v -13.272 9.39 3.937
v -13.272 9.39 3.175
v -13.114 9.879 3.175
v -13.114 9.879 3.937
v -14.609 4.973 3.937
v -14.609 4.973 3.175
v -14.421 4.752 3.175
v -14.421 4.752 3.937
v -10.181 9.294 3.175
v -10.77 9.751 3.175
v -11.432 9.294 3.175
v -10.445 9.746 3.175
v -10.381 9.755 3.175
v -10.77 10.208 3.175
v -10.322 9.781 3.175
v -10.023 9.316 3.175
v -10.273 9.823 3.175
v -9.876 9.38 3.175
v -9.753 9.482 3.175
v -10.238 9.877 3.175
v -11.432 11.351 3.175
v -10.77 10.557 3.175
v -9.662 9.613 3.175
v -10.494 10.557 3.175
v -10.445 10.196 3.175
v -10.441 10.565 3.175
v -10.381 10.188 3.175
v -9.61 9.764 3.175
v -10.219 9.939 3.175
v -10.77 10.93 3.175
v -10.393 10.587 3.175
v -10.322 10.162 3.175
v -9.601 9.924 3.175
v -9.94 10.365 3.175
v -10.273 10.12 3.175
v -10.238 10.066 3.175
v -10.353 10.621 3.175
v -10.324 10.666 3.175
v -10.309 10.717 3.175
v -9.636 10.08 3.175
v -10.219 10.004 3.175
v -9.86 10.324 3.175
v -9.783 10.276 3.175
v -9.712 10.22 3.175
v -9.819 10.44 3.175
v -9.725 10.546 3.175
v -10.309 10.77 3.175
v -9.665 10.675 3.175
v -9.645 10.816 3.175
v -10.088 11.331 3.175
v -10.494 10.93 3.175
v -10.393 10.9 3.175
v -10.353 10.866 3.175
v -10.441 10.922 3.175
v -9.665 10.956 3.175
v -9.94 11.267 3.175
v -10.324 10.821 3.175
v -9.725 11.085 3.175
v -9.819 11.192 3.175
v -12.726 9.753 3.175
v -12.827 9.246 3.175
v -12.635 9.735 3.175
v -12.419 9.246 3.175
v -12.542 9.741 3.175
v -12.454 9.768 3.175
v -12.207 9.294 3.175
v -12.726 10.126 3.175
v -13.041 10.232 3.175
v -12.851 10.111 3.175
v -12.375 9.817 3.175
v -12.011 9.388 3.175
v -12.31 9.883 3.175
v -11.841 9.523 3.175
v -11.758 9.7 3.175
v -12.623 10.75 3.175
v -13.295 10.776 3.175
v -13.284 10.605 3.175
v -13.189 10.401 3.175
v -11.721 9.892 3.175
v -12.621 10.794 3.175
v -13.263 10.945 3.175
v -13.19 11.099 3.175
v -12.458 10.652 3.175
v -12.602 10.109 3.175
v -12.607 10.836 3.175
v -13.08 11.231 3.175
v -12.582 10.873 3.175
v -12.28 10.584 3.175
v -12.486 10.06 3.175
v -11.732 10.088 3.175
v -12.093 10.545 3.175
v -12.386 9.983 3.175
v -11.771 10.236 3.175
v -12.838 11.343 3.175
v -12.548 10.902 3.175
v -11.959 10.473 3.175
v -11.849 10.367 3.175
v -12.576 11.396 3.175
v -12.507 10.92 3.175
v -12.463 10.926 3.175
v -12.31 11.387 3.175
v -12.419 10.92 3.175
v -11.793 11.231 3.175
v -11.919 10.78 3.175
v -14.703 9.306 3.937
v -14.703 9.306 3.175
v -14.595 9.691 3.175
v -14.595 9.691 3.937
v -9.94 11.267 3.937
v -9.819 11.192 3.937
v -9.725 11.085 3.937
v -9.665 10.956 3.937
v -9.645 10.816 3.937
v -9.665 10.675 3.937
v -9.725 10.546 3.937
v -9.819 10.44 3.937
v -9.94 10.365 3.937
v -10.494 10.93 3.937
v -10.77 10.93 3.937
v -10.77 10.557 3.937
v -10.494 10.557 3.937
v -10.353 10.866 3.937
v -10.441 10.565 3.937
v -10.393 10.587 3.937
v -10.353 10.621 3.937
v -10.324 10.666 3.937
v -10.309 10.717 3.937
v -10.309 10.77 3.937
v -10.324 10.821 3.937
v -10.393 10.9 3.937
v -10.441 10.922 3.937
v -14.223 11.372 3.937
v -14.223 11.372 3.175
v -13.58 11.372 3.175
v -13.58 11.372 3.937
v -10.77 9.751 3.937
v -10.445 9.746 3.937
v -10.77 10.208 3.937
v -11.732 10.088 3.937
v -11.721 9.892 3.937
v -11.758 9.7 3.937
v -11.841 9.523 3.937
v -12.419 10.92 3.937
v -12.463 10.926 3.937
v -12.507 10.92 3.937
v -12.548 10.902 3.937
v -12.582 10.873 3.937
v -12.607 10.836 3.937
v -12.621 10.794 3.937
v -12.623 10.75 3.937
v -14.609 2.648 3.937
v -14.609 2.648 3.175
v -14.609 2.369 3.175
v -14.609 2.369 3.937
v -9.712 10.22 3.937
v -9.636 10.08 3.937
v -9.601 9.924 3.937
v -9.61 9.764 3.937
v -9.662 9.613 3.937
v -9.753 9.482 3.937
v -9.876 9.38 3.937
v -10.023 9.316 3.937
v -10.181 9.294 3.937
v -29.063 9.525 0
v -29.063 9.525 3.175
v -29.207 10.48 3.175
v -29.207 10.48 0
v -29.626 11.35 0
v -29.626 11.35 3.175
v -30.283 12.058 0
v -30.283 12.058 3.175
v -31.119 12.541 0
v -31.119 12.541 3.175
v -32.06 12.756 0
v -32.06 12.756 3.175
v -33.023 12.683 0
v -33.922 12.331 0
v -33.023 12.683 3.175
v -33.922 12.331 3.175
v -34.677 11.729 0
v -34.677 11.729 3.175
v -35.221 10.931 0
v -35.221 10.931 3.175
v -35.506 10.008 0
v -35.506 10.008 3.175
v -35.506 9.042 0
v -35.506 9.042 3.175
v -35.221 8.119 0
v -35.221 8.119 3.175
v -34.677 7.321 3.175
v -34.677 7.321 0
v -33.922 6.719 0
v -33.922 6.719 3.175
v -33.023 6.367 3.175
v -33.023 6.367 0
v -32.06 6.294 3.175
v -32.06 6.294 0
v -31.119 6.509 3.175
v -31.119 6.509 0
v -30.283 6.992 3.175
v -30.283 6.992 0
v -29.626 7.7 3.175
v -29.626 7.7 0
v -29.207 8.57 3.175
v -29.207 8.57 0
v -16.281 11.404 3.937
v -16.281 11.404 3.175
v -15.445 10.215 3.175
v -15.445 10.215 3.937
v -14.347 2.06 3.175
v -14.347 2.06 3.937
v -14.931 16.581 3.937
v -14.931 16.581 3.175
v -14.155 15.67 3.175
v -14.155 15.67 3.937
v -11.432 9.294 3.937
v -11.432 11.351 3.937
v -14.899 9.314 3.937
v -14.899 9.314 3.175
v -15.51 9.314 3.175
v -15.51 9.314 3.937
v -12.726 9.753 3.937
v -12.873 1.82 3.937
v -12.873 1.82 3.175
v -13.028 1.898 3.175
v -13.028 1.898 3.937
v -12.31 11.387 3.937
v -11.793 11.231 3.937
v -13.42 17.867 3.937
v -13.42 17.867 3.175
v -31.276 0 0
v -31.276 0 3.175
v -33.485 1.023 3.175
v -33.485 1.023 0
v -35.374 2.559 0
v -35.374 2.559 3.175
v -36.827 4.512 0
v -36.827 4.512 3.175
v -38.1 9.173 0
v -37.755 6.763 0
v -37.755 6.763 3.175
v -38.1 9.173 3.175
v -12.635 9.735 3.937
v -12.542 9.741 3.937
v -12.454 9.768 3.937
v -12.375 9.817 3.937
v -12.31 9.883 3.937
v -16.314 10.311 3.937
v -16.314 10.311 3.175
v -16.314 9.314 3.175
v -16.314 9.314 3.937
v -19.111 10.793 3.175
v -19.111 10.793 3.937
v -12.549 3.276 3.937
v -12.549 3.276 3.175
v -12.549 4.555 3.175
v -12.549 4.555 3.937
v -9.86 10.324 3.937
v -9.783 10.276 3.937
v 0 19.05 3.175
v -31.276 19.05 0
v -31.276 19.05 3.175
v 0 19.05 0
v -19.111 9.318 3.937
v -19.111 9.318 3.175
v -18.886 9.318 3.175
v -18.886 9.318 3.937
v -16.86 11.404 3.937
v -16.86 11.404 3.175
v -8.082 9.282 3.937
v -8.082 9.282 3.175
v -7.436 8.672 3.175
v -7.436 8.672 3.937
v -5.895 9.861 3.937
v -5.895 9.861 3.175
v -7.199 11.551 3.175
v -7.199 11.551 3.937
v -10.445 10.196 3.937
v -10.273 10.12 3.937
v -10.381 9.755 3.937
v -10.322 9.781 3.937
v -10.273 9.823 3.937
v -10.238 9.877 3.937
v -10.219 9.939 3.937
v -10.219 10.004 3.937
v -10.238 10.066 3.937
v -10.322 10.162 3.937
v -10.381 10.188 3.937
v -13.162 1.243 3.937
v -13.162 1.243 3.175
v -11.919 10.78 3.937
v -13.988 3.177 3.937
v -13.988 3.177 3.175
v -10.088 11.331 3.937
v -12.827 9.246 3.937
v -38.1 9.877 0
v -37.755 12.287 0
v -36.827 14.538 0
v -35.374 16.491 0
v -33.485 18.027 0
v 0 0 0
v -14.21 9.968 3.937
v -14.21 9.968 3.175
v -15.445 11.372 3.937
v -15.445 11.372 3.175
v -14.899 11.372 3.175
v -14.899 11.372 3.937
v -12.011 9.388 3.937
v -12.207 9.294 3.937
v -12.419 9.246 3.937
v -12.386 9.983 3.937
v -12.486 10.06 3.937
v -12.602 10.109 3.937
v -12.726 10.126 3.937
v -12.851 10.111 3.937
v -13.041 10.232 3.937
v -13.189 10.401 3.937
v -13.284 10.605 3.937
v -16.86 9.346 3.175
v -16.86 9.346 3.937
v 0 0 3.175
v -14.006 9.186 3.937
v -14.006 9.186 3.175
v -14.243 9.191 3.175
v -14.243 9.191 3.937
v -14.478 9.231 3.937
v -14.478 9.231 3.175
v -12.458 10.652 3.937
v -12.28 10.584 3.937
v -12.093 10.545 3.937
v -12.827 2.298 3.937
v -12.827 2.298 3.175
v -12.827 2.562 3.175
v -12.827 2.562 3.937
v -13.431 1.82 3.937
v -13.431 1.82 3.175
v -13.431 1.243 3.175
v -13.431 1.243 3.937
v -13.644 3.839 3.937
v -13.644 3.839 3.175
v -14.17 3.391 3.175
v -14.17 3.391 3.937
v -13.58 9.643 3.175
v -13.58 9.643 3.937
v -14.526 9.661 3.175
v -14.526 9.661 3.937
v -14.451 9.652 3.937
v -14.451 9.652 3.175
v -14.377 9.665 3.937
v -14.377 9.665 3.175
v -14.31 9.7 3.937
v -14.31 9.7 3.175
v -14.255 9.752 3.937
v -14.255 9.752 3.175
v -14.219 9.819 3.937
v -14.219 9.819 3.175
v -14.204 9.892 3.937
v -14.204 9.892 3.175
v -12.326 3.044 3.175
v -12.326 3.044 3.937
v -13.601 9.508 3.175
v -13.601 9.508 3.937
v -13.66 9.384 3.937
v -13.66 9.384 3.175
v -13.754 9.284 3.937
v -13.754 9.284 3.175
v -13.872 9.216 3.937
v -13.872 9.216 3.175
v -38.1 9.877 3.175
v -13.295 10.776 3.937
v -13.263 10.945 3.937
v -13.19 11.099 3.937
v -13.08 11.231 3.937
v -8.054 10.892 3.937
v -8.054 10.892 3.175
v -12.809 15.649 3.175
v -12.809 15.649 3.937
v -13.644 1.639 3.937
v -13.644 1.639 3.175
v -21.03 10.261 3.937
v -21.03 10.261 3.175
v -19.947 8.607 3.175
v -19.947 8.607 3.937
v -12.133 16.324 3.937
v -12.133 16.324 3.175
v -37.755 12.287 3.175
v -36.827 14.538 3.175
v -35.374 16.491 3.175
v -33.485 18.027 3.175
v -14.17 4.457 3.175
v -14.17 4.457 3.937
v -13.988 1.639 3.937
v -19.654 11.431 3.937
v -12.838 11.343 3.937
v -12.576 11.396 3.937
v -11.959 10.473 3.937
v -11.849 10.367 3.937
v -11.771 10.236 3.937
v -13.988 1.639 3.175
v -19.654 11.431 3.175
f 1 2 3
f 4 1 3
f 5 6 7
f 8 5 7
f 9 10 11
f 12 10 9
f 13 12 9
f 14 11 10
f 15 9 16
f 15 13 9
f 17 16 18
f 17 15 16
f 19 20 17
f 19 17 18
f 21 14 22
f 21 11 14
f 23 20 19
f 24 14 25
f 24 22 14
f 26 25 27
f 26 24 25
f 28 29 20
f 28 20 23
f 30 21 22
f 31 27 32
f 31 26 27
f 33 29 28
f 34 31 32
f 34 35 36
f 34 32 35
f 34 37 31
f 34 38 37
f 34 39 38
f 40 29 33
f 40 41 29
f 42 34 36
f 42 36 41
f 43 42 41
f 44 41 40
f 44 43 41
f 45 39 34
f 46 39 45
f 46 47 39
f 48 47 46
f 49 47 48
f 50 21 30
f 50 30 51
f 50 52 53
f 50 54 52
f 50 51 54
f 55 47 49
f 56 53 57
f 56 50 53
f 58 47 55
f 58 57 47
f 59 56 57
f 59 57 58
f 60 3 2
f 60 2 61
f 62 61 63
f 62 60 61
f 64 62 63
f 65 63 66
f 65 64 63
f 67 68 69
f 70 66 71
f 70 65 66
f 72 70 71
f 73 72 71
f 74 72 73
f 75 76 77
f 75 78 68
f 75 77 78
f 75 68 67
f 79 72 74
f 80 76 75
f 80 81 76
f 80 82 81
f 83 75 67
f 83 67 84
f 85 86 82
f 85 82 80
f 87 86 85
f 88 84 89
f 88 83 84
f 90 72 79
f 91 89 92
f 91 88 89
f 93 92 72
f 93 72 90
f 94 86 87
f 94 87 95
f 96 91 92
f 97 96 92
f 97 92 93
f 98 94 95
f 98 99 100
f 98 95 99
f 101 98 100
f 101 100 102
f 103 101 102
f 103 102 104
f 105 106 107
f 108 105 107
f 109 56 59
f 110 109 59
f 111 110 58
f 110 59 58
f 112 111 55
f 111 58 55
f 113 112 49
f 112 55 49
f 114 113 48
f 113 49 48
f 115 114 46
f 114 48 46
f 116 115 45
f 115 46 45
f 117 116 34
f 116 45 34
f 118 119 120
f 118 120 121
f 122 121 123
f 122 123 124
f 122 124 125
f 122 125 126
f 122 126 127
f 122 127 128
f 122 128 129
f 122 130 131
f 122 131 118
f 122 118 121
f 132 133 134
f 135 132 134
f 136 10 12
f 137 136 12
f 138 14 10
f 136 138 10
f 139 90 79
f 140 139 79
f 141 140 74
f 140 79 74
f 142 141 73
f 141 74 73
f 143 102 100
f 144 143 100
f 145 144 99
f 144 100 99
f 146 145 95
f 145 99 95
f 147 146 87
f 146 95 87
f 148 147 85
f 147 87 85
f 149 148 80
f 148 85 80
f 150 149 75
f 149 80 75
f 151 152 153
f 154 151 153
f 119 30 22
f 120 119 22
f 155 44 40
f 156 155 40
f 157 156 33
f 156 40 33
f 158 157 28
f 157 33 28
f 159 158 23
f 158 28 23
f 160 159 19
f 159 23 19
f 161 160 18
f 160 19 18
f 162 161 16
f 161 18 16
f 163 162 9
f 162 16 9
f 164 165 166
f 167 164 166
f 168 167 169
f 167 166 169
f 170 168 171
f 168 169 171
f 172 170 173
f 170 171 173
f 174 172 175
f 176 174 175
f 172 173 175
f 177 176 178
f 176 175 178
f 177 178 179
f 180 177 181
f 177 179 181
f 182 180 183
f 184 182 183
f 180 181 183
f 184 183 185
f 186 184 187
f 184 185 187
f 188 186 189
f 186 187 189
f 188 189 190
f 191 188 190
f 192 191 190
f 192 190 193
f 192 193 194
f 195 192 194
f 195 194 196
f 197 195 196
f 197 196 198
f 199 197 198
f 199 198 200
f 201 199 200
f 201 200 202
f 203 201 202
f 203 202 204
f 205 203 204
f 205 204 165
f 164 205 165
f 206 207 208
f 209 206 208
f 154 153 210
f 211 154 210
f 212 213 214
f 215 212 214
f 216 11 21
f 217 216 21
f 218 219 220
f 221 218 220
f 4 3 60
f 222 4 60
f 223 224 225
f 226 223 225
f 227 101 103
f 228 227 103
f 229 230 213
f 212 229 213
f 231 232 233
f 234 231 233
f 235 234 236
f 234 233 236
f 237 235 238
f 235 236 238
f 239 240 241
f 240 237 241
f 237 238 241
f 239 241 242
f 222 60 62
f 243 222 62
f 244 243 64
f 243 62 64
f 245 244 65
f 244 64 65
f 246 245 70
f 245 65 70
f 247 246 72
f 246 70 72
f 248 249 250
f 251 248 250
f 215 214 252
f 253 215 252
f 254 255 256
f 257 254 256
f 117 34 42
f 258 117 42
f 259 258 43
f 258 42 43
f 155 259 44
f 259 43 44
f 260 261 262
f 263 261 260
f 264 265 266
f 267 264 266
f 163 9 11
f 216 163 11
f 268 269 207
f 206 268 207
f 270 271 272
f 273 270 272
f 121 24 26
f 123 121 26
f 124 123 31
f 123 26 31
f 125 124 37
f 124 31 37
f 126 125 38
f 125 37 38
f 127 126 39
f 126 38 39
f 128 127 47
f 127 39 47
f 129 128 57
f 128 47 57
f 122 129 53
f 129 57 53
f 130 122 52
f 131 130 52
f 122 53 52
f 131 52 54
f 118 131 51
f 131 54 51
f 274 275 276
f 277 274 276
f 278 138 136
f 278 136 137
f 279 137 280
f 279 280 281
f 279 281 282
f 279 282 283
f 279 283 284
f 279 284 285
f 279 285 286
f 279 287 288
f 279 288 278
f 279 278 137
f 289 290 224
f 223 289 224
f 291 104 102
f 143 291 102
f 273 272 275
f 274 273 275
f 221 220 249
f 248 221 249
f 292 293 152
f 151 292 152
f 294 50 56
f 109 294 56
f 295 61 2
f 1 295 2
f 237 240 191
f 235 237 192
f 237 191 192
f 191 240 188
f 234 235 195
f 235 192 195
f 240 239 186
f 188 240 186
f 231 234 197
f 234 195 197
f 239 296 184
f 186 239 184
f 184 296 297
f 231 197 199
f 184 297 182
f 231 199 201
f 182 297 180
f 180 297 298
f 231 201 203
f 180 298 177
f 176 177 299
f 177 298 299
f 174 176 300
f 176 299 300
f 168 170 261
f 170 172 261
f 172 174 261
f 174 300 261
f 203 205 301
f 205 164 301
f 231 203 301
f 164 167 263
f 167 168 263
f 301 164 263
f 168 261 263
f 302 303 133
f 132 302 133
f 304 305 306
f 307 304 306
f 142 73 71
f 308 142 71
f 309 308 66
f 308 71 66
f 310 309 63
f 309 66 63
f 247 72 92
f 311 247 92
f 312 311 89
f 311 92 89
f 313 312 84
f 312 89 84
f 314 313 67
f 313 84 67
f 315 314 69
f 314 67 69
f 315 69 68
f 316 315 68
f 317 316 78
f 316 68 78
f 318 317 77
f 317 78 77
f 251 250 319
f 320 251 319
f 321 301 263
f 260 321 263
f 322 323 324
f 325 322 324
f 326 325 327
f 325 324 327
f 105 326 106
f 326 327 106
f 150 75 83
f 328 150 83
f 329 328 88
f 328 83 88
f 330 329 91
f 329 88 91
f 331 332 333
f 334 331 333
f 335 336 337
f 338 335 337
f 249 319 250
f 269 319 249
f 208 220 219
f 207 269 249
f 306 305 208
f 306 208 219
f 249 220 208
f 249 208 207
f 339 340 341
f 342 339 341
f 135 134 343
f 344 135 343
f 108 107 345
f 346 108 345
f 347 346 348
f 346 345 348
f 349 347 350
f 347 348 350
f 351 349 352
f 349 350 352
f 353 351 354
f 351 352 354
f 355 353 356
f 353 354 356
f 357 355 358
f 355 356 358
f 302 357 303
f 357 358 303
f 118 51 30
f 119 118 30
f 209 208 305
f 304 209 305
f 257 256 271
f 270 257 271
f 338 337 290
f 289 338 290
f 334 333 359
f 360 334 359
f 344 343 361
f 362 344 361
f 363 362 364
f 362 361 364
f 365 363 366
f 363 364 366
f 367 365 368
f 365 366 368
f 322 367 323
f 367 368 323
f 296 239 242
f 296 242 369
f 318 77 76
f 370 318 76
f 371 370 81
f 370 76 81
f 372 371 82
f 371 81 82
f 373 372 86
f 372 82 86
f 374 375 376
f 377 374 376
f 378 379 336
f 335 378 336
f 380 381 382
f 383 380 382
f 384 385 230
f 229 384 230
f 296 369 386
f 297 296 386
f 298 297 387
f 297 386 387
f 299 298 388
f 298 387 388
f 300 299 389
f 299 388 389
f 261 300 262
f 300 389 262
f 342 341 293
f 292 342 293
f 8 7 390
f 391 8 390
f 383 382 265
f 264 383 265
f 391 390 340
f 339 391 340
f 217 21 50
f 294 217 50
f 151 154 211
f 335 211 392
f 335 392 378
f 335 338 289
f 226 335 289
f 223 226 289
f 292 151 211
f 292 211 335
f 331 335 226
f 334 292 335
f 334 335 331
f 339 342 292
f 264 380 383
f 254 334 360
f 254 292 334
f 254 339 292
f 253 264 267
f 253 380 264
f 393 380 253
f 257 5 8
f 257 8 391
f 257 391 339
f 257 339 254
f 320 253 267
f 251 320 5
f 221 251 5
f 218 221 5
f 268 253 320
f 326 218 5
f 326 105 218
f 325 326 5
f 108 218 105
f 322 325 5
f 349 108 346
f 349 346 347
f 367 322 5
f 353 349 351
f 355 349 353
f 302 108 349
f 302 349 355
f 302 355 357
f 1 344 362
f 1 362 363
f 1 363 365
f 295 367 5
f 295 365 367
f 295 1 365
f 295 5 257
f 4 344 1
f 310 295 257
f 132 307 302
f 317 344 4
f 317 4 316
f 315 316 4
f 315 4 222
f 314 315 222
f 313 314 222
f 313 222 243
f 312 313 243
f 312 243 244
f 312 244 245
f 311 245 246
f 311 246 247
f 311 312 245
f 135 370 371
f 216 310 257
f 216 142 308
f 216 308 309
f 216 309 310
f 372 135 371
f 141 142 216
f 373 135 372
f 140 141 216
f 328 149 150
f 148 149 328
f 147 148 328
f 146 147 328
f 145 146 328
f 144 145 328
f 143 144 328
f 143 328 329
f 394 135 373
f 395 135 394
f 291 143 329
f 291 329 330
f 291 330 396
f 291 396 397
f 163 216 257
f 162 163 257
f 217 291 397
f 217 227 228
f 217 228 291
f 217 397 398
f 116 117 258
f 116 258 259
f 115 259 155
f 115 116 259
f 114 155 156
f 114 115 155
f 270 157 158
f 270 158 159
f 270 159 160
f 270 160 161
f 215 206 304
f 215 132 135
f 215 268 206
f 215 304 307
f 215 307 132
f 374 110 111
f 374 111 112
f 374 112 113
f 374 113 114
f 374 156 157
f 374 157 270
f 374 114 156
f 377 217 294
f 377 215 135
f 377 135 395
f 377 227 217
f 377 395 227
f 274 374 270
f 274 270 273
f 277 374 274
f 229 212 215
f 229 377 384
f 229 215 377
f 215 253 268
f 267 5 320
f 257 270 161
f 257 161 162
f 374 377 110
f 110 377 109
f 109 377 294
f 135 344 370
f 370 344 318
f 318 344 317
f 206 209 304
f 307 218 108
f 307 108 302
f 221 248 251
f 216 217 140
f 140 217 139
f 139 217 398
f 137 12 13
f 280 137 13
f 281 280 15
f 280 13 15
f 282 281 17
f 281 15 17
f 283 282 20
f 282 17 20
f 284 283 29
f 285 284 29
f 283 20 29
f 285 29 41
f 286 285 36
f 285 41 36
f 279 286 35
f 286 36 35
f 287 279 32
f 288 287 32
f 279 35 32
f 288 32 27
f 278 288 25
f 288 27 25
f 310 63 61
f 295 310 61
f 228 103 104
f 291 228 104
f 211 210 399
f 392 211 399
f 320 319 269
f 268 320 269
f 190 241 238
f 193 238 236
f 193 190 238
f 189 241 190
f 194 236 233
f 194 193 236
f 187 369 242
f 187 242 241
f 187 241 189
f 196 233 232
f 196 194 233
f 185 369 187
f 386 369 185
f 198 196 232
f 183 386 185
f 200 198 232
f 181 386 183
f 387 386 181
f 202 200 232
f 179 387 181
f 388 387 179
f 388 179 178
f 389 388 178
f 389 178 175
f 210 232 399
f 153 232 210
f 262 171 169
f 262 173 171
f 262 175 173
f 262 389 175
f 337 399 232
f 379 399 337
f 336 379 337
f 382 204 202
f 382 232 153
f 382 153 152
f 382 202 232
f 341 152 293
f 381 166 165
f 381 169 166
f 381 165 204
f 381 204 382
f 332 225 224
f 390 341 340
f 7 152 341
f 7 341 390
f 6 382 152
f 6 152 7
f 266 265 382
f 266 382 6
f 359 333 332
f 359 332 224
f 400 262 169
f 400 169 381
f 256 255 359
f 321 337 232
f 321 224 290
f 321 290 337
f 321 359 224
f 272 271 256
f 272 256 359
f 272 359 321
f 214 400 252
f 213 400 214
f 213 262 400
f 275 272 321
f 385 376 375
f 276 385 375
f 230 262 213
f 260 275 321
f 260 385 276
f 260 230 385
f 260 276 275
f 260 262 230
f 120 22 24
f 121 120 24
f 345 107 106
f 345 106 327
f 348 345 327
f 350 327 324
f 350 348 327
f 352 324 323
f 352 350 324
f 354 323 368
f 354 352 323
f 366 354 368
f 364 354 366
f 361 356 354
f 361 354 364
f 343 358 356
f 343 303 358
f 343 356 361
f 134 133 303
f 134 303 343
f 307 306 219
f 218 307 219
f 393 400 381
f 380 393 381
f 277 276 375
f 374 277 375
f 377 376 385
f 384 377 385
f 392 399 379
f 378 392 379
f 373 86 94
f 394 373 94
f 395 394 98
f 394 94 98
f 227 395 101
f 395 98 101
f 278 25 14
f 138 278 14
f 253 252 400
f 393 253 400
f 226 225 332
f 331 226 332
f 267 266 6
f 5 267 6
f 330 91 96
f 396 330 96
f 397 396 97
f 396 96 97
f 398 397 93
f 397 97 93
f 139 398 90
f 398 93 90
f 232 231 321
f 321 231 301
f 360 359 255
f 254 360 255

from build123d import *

# Parameters (mm, degrees)
F0_W     = 38.1
F0_H     = 19.05
F1_DEPTH = 3.175
F2_R     = 3.239621
F3_DEPTH = 3.176
F5_DEPTH = 0.762


with BuildPart() as f1:
    # F0 (on Top) → F1 (new body)
    with BuildSketch(Plane.XY):
        with Locations((-19.05, 9.525)):
            Rectangle(F0_W, F0_H)
    extrude(amount=F1_DEPTH)

    # F2 (on face) → F3 (cut, through all)
    with BuildSketch(Plane.XY.offset(3.175)):
        with BuildLine():
            ThreePointArc((-38.1, 9.877407), (-36.161286, 15.559844), (-31.275846, 19.05))
            Line((-31.275846, 19.05), (-38.1, 19.05))
            Line((-38.1, 19.05), (-38.1, 9.877407))
        make_face()
        with BuildLine():
            ThreePointArc((-31.275846, 0), (-36.161286, 3.490156), (-38.1, 9.172593))
            Line((-38.1, 9.172593), (-38.1, 0))
            Line((-38.1, 0), (-31.275846, 0))
        make_face()
        with Locations((-32.302372, 9.525)):
            Circle(F2_R)
    extrude(amount=-F3_DEPTH, mode=Mode.SUBTRACT)

    # F4 (on face) → F5 (join)
    with BuildSketch(Plane.XY.offset(3.175)):
        Polygon((-12.133155, 16.323839), (-13.419535, 17.867444), (-14.930828, 16.581235), (-14.155187, 15.669858), (-19.111004, 10.793301), (-19.653987, 11.431306), (-21.029584, 10.260583), (-19.947039, 8.606749), (-19.111004, 9.318269), (-18.885918, 9.318269), (-14.609277, 4.973212), (-14.512812, 5.356764), (-14.512812, 5.616316), (-14.239308, 6.20037), (-14.159105, 6.484506), (-12.678197, 6.066489), (-12.678197, 5.356764), (-12.937207, 5.101833), (-12.937207, 4.555195), (-12.549366, 4.555195), (-8.081773, 9.282008), (-7.436184, 8.671823), (-5.89522, 9.860801), (-7.199443, 11.551126), (-8.05396, 10.891797), (-12.808586, 15.648736), align=None)
        Polygon((-16.313503, 9.314163), (-16.86014, 9.346317), (-16.86014, 11.40425), (-16.281348, 11.40425), (-15.445312, 10.214509), (-15.445312, 11.372095), (-14.898674, 11.372095), (-14.898674, 9.314163), (-15.509622, 9.314163), (-16.313503, 10.310974), align=None, mode=Mode.SUBTRACT)
        with BuildLine():
            Line((-14.210255, 9.967692), (-14.223414, 11.372095))
            Line((-14.223414, 11.372095), (-13.580311, 11.372095))
            Line((-13.580311, 11.372095), (-13.580311, 9.642933))
            ThreePointArc((-13.580311, 9.642933), (-13.703139, 9.33071), (-14.005777, 9.185865))
            ThreePointArc((-14.005777, 9.185865), (-14.361345, 9.206839), (-14.703408, 9.306146))
            Line((-14.703408, 9.306146), (-14.595155, 9.691046))
            ThreePointArc((-14.595155, 9.691046), (-14.309597, 9.699827), (-14.210255, 9.967692))
        make_face(mode=Mode.SUBTRACT)
        with BuildLine():
            Line((-12.309813, 11.38701), (-11.792604, 11.230645))
            Line((-11.792604, 11.230645), (-11.919432, 10.779702))
            Line((-11.919432, 10.779702), (-12.419279, 10.920285))
            ThreePointArc((-12.419279, 10.920285), (-12.566064, 10.888649), (-12.622545, 10.74952))
            ThreePointArc((-12.622545, 10.74952), (-12.370625, 10.614414), (-12.093307, 10.545042))
            ThreePointArc((-12.093307, 10.545042), (-11.848866, 10.36705), (-11.732464, 10.087973))
            ThreePointArc((-11.732464, 10.087973), (-11.733256, 9.7951), (-11.840717, 9.522652))
            ThreePointArc((-11.840717, 9.522652), (-12.10655, 9.335291), (-12.419279, 9.246006))
            Line((-12.419279, 9.246006), (-12.827022, 9.246006))
            Line((-12.827022, 9.246006), (-13.272062, 9.390343))
            Line((-13.272062, 9.390343), (-13.113701, 9.878622))
            Line((-13.113701, 9.878622), (-12.726019, 9.752887))
            ThreePointArc((-12.726019, 9.752887), (-12.49708, 9.751795), (-12.309813, 9.883496))
            ThreePointArc((-12.309813, 9.883496), (-12.54216, 10.088347), (-12.851078, 10.111114))
            ThreePointArc((-12.851078, 10.111114), (-13.120867, 10.31145), (-13.28409, 10.605182))
            ThreePointArc((-13.28409, 10.605182), (-13.263213, 10.944513), (-13.079613, 11.230645))
            ThreePointArc((-13.079613, 11.230645), (-12.708492, 11.376665), (-12.309813, 11.38701))
        make_face(mode=Mode.SUBTRACT)
        with BuildLine():
            Line((-11.43176, 9.294118), (-11.43176, 11.350926))
            Line((-11.43176, 11.350926), (-10.087523, 11.330864))
            Line((-10.087523, 11.330864), (-9.940274, 11.266729))
            ThreePointArc((-9.940274, 11.266729), (-9.644752, 10.815674), (-9.940274, 10.36462))
            ThreePointArc((-9.940274, 10.36462), (-9.820796, 10.300702), (-9.711741, 10.220283))
            ThreePointArc((-9.711741, 10.220283), (-9.661743, 9.61308), (-10.180837, 9.294118))
            Line((-10.180837, 9.294118), (-11.43176, 9.294118))
        make_face(mode=Mode.SUBTRACT)
        with BuildLine():
            Line((-10.445168, 10.196227), (-10.770215, 10.208255))
            Line((-10.770215, 10.208255), (-10.770215, 9.751187))
            Line((-10.770215, 9.751187), (-10.445168, 9.746336))
            ThreePointArc((-10.445168, 9.746336), (-10.216841, 9.971281), (-10.445168, 10.196227))
        make_face()
        with BuildLine():
            Line((-10.770215, 10.929941), (-10.770215, 10.55707))
            Line((-10.770215, 10.55707), (-10.493567, 10.55707))
            ThreePointArc((-10.493567, 10.55707), (-10.307132, 10.743506), (-10.493567, 10.929941))
            Line((-10.493567, 10.929941), (-10.770215, 10.929941))
        make_face()
        Polygon((-12.549366, 3.912091), (-12.549366, 4.555195), (-12.937207, 4.555195), (-12.937207, 5.101833), (-12.678197, 5.356764), (-12.678197, 6.066489), (-14.159105, 6.484506), (-14.239308, 6.20037), (-14.512812, 5.616316), (-14.512812, 5.356764), (-14.609277, 4.973212), (-14.421192, 4.752211), (-14.170298, 4.457412), (-13.643861, 3.838849), (-14.170298, 3.390817), (-13.987954, 3.176562), (-14.609277, 2.647775), (-14.609277, 2.368642), (-14.346565, 2.059955), (-13.987954, 1.638587), (-13.643861, 1.638587), (-13.430775, 1.819937), (-13.430775, 1.24321), (-13.162293, 1.24321), (-12.872897, 1.819937), (-13.028217, 1.897875), (-12.827437, 2.298001), (-12.827437, 2.561572), (-12.326258, 3.0439), (-12.549366, 3.275728), align=None)
    extrude(amount=F5_DEPTH)


solid = f1.part
